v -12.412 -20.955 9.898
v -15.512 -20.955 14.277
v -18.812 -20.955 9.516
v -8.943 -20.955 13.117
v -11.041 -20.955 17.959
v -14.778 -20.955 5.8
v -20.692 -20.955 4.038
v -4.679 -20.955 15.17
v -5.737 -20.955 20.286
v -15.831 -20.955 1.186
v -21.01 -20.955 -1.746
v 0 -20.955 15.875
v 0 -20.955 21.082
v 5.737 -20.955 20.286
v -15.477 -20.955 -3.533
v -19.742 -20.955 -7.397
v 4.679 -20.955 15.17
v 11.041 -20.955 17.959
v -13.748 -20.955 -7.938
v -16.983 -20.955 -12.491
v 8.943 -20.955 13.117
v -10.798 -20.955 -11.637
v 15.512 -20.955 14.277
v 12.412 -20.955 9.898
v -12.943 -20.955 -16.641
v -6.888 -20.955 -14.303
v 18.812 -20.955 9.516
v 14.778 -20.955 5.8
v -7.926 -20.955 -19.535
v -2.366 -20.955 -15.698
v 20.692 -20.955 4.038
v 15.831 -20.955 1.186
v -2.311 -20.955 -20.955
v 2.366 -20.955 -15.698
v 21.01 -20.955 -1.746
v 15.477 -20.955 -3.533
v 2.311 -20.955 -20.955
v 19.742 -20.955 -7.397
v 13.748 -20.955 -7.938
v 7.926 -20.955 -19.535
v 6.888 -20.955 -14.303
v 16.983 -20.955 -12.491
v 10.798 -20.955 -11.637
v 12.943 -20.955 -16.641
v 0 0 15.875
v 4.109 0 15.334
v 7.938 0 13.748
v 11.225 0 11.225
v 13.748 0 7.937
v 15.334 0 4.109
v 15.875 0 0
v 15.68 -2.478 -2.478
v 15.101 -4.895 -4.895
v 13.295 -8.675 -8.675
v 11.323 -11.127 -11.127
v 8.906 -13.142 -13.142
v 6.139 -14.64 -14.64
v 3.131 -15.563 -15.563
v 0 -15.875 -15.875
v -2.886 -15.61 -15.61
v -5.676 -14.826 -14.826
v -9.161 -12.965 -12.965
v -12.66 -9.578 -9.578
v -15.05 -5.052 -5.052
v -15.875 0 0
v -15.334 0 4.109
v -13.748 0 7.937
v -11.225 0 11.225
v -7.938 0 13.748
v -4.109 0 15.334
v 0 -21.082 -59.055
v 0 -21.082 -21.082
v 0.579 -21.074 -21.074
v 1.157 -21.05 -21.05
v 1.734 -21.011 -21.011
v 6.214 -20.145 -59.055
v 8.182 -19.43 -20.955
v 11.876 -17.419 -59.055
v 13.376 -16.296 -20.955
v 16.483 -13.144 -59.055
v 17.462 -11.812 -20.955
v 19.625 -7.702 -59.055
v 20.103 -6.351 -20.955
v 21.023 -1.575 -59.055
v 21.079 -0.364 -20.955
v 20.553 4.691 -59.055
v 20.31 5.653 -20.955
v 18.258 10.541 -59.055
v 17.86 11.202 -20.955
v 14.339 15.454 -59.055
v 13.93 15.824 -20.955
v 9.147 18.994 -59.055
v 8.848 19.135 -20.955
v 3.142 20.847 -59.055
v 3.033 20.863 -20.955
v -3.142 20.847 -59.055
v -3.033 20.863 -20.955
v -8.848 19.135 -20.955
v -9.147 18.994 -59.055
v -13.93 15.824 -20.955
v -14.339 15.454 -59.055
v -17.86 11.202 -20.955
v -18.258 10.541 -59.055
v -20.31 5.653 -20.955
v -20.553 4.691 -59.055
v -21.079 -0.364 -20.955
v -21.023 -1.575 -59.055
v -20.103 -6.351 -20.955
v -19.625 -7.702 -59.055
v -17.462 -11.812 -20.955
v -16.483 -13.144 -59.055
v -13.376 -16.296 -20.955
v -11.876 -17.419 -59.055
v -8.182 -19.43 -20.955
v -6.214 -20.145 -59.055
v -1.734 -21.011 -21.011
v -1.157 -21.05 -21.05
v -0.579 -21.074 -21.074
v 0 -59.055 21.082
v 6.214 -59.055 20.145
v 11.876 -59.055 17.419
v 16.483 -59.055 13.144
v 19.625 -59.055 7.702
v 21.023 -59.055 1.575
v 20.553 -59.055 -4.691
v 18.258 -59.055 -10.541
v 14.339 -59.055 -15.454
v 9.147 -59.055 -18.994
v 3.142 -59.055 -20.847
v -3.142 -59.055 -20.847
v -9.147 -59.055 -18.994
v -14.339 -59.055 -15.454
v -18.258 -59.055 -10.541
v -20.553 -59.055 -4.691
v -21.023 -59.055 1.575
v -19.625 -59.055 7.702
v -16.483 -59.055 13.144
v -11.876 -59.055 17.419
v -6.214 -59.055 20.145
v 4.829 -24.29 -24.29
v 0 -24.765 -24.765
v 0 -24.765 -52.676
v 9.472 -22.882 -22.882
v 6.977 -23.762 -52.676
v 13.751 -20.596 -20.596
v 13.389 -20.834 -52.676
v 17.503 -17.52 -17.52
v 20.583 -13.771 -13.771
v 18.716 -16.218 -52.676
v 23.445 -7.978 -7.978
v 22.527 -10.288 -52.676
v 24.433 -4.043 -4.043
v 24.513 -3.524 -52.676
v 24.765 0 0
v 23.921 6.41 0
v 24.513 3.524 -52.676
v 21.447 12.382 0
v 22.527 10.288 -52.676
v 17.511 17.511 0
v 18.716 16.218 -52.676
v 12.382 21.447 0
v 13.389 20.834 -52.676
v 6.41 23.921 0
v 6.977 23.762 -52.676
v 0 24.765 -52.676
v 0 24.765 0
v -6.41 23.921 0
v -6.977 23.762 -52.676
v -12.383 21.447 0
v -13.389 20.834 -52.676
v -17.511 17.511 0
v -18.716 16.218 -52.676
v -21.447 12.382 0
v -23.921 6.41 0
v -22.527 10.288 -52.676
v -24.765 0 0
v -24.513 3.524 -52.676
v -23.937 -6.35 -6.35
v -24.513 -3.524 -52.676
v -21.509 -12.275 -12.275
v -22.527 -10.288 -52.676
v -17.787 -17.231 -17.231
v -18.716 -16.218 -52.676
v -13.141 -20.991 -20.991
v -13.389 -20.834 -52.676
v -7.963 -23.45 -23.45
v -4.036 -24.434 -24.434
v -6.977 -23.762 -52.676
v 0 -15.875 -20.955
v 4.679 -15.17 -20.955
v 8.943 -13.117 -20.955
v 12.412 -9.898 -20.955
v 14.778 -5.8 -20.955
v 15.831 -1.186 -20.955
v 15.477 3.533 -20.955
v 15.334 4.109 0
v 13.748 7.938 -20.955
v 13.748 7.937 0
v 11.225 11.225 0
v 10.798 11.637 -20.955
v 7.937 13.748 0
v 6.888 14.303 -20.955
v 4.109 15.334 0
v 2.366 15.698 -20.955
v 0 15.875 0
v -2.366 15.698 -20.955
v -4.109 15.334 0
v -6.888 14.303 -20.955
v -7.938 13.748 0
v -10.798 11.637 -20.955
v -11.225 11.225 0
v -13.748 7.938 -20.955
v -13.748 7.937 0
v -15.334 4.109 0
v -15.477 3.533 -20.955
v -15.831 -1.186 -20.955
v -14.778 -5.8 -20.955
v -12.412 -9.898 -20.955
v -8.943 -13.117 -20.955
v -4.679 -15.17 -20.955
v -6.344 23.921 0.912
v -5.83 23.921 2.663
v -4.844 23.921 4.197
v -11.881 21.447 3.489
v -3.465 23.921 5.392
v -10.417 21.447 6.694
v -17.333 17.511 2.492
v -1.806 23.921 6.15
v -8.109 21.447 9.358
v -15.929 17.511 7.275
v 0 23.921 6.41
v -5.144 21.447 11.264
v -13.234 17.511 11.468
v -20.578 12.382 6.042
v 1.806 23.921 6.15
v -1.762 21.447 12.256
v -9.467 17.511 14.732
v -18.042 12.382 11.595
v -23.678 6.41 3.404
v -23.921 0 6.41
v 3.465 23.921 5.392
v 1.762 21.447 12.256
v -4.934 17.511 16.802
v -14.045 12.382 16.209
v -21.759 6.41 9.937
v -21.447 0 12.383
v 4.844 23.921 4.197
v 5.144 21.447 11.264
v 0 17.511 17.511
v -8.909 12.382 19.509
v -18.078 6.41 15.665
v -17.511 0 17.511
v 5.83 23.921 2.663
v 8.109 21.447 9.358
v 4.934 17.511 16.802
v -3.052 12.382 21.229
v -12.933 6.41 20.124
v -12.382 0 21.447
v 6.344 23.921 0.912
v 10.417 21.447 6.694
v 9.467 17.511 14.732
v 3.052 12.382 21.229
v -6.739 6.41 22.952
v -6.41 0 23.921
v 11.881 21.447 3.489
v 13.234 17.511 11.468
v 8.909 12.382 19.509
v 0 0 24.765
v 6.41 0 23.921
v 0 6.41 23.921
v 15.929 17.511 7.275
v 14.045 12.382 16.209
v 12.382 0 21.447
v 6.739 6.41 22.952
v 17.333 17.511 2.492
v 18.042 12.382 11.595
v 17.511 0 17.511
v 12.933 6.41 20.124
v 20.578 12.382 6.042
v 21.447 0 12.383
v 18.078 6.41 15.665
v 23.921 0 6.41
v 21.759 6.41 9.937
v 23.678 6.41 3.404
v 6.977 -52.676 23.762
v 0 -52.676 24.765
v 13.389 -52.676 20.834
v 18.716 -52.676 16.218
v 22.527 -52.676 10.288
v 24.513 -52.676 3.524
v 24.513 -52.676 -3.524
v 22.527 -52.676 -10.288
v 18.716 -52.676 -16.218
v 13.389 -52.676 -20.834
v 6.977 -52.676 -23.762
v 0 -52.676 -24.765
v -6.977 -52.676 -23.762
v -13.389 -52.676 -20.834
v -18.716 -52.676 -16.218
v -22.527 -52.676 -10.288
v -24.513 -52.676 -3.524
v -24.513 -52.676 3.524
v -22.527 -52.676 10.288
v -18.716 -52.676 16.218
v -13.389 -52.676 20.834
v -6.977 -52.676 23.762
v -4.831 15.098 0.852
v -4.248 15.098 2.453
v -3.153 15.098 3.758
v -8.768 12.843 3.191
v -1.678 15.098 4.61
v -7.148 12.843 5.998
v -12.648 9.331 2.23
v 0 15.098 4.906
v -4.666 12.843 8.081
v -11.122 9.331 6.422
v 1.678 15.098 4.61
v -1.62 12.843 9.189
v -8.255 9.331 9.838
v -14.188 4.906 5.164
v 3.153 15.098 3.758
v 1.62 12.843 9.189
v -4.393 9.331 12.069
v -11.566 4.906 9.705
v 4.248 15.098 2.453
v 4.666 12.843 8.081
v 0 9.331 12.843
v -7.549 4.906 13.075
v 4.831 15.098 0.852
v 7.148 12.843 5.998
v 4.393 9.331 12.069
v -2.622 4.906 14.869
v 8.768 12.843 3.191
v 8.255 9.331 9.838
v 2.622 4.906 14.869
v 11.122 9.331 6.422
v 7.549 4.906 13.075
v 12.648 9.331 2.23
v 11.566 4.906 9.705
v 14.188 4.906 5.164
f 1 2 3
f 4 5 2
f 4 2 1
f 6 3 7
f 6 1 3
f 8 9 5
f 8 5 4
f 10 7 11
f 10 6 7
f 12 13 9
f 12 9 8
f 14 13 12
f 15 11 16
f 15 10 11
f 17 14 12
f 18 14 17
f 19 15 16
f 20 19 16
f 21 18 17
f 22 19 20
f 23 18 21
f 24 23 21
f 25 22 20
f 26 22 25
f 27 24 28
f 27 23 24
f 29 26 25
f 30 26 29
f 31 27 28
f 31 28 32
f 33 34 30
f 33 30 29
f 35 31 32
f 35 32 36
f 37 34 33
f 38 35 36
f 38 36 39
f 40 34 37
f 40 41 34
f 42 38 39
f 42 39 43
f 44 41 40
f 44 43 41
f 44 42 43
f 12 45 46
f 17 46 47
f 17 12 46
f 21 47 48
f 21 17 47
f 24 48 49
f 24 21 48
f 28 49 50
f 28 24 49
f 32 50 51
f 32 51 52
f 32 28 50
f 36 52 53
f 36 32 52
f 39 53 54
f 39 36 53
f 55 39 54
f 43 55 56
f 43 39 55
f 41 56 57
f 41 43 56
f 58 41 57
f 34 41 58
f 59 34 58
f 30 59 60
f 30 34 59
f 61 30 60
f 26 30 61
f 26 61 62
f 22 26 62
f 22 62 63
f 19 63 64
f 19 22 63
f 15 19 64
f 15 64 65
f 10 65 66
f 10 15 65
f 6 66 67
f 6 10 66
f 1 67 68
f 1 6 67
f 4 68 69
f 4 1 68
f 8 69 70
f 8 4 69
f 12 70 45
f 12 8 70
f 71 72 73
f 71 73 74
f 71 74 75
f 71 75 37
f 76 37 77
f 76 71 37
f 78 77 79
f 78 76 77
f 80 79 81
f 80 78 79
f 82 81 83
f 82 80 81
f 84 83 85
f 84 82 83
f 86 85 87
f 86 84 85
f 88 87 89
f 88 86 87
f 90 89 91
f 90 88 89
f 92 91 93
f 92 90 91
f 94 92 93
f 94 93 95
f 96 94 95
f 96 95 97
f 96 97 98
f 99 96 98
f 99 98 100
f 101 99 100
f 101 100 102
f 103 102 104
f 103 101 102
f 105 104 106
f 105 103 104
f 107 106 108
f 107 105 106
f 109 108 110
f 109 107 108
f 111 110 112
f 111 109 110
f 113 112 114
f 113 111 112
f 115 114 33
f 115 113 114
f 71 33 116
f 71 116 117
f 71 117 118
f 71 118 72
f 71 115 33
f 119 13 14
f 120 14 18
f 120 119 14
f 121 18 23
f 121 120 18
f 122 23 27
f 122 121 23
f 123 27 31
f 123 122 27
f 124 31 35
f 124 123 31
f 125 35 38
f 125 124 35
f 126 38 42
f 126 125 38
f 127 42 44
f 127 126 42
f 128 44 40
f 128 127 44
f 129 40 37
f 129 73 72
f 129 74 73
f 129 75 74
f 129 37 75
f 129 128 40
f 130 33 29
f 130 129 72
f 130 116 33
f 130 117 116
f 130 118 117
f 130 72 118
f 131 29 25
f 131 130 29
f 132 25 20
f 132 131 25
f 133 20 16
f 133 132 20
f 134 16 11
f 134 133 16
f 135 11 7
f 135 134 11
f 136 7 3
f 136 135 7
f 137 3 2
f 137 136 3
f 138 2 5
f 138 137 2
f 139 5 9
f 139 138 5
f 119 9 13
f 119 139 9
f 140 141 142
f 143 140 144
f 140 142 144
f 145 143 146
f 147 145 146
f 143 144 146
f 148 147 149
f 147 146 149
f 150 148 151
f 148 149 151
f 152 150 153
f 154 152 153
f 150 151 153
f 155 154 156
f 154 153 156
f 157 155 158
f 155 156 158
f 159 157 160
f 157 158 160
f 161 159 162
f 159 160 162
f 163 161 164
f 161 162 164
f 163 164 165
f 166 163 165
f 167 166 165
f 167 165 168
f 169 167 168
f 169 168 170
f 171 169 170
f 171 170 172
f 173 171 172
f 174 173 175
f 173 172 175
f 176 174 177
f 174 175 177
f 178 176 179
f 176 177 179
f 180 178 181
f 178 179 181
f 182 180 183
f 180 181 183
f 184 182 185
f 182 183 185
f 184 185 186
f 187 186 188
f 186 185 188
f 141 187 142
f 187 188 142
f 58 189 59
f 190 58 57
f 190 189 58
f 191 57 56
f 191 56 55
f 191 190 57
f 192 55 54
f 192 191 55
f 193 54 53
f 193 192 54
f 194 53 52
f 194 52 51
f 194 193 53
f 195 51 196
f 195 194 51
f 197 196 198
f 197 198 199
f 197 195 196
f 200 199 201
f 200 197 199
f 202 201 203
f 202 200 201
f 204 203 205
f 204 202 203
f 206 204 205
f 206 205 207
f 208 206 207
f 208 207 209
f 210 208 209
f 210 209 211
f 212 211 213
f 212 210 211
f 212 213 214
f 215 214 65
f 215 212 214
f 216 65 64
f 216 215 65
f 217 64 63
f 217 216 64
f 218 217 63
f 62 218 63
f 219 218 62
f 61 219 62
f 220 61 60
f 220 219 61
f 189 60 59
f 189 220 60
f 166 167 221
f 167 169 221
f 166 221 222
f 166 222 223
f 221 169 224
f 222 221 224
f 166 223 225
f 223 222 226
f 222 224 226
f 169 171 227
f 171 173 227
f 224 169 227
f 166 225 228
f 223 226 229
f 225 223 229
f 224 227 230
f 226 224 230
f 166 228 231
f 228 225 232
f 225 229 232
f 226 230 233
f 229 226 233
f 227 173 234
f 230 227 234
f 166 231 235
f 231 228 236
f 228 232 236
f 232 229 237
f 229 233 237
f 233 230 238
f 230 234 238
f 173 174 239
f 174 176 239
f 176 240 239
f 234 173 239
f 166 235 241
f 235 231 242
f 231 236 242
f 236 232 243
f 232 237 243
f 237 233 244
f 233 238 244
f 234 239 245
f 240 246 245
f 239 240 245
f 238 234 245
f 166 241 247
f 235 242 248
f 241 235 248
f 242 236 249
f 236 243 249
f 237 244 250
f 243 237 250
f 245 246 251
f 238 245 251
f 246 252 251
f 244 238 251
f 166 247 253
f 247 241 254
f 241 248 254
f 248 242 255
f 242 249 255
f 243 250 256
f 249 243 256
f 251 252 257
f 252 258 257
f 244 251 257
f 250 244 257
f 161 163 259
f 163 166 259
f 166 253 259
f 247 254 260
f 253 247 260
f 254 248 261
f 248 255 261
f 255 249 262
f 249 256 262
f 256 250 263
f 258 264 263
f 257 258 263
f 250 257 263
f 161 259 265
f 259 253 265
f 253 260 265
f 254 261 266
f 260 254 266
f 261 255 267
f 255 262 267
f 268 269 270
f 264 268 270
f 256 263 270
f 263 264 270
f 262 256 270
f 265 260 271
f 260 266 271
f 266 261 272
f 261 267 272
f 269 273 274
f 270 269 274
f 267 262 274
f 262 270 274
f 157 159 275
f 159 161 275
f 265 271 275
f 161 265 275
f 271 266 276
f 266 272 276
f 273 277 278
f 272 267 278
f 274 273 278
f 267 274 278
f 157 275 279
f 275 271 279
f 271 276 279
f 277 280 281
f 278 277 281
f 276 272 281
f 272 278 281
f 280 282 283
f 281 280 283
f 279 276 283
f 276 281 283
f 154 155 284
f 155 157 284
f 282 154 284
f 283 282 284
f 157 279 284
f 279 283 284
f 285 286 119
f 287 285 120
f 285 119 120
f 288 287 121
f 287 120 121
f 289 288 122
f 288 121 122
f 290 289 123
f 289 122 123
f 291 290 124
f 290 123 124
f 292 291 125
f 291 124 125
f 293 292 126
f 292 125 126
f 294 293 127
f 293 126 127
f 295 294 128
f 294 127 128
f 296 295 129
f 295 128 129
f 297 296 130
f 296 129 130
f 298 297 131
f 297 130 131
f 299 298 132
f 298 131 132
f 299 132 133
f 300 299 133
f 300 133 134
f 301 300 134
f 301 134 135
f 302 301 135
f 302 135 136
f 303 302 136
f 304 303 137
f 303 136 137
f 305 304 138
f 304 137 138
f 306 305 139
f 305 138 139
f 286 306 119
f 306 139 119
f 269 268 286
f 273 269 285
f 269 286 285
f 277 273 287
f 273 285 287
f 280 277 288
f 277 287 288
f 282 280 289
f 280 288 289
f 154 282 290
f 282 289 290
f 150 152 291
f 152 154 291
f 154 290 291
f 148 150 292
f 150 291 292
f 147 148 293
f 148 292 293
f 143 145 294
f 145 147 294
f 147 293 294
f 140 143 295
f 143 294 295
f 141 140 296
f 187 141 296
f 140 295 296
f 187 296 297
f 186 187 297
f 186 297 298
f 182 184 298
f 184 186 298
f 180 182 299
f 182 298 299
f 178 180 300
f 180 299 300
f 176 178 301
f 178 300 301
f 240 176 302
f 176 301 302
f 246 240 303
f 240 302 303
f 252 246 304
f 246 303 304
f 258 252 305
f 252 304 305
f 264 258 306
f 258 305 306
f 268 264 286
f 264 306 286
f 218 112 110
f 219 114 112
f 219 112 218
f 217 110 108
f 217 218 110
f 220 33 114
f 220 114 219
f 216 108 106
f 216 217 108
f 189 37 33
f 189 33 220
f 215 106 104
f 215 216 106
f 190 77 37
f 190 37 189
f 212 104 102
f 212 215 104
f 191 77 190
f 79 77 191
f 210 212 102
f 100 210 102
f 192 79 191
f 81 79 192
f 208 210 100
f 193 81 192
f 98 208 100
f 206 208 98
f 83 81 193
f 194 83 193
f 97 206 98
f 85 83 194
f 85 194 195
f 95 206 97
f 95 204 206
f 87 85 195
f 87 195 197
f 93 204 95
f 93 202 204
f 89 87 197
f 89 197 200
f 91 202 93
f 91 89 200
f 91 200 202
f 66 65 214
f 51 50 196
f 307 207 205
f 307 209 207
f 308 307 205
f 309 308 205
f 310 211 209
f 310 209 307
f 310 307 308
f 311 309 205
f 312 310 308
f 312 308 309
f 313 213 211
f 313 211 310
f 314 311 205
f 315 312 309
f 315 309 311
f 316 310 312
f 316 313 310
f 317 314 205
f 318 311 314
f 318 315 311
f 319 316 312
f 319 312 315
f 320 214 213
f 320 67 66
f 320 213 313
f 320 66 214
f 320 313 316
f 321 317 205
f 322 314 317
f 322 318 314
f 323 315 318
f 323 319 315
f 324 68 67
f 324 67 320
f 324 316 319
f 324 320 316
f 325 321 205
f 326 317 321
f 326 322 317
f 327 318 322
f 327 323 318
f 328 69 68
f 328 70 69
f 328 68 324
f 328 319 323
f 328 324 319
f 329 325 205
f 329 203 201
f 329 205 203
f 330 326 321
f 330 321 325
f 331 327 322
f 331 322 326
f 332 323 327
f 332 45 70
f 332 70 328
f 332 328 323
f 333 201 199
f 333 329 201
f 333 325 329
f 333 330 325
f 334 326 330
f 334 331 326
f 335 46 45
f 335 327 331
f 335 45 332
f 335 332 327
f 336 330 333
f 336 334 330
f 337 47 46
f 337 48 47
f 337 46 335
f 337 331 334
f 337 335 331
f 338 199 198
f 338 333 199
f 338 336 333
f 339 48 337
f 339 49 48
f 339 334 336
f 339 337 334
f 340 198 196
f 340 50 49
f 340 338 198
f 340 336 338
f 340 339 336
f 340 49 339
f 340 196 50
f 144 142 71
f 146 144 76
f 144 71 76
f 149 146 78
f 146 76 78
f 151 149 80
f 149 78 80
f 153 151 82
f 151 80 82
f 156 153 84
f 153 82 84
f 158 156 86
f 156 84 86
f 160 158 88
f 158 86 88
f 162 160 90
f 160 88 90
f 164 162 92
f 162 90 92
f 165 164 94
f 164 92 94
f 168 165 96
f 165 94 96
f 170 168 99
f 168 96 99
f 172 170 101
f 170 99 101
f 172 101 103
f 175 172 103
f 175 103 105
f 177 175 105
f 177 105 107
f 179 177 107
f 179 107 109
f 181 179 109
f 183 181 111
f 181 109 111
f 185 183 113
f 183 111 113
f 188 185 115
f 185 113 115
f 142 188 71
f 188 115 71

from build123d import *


with BuildPart() as f2:
    # F0 (on Right) → F2 (revolve)
    with BuildSketch(Plane.YZ):
        with BuildLine():
            Line((-52.6758568757, 24.765), (-59.055, 21.082))
            Line((-59.055, 21.082), (-20.955, 21.082))
            Line((-20.955, 21.082), (-20.955, 15.875))
            Line((-20.955, 15.875), (0, 15.875))
            ThreePointArc((0, 15.875), (11.2253201513, 11.2253201513), (15.875, 0))
            Line((15.875, 0), (24.765, 0))
            ThreePointArc((24.765, 0), (17.5114994361, 17.5114994361), (0, 24.765))
            Line((0, 24.765), (-52.6758568757, 24.765))
        make_face()
        with BuildLine():
            Line((-20.955, 21.082), (-59.055, 21.082))
            Line((-59.055, 21.082), (-59.055, 0))
            Line((-59.055, 0), (0, 0))
            Line((0, 0), (10.5189766587, 0))
            Line((10.5189766587, 0), (15.875, 0))
            ThreePointArc((15.875, 0), (11.2253201513, 11.2253201513), (0, 15.875))
            Line((0, 15.875), (-20.955, 15.875))
            Line((-20.955, 15.875), (-20.955, 21.082))
        make_face()
    revolve(axis=Axis((0, -21.59, 0), (0, 1, 0)))

    # F1 (on Right) → F3 (revolve)
    with BuildSketch(Plane.YZ):
        with BuildLine():
            Line((-24.765, -52.6758568757), (-21.082, -59.055))
            Line((-21.082, -59.055), (-21.082, -20.955))
            Line((-21.082, -20.955), (-15.875, -20.955))
            Line((-15.875, -20.955), (-15.875, 0))
            ThreePointArc((-15.875, 0), (-11.2253201513, 11.2253201513), (0, 15.875))
            Line((0, 15.875), (0, 24.765))
            ThreePointArc((0, 24.765), (-17.5114994361, 17.5114994361), (-24.765, 0))
            Line((-24.765, 0), (-24.765, -52.6758568757))
        make_face()
        with BuildLine():
            Line((-21.082, -20.955), (-21.082, -59.055))
            Line((-21.082, -59.055), (0, -59.055))
            Line((0, -59.055), (0, 0))
            Line((0, 0), (0, 15.875))
            ThreePointArc((0, 15.875), (-11.2253201513, 11.2253201513), (-15.875, 0))
            Line((-15.875, 0), (-15.875, -20.955))
            Line((-15.875, -20.955), (-21.082, -20.955))
        make_face()
    revolve(axis=Axis((0, 0, -21.59), (0, 0, 1)))

    # F0 (on Right) → F4 (revolve, cut)
    with BuildSketch(Plane.YZ):
        with BuildLine():
            Line((-20.955, 21.082), (-59.055, 21.082))
            Line((-59.055, 21.082), (-59.055, 0))
            Line((-59.055, 0), (0, 0))
            Line((0, 0), (10.5189766587, 0))
            Line((10.5189766587, 0), (15.875, 0))
            ThreePointArc((15.875, 0), (11.2253201513, 11.2253201513), (0, 15.875))
            Line((0, 15.875), (-20.955, 15.875))
            Line((-20.955, 15.875), (-20.955, 21.082))
        make_face()
    revolve(axis=Axis((0, -21.59, 0), (0, 1, 0)), mode=Mode.SUBTRACT)

    # F1 (on Right) → F5 (revolve, cut)
    with BuildSketch(Plane.YZ):
        with BuildLine():
            Line((-21.082, -20.955), (-21.082, -59.055))
            Line((-21.082, -59.055), (0, -59.055))
            Line((0, -59.055), (0, 0))
            Line((0, 0), (0, 15.875))
            ThreePointArc((0, 15.875), (-11.2253201513, 11.2253201513), (-15.875, 0))
            Line((-15.875, 0), (-15.875, -20.955))
            Line((-15.875, -20.955), (-21.082, -20.955))
        make_face()
    revolve(axis=Axis((0, 0, -21.59), (0, 0, 1)), mode=Mode.SUBTRACT)


solid = f2.part
